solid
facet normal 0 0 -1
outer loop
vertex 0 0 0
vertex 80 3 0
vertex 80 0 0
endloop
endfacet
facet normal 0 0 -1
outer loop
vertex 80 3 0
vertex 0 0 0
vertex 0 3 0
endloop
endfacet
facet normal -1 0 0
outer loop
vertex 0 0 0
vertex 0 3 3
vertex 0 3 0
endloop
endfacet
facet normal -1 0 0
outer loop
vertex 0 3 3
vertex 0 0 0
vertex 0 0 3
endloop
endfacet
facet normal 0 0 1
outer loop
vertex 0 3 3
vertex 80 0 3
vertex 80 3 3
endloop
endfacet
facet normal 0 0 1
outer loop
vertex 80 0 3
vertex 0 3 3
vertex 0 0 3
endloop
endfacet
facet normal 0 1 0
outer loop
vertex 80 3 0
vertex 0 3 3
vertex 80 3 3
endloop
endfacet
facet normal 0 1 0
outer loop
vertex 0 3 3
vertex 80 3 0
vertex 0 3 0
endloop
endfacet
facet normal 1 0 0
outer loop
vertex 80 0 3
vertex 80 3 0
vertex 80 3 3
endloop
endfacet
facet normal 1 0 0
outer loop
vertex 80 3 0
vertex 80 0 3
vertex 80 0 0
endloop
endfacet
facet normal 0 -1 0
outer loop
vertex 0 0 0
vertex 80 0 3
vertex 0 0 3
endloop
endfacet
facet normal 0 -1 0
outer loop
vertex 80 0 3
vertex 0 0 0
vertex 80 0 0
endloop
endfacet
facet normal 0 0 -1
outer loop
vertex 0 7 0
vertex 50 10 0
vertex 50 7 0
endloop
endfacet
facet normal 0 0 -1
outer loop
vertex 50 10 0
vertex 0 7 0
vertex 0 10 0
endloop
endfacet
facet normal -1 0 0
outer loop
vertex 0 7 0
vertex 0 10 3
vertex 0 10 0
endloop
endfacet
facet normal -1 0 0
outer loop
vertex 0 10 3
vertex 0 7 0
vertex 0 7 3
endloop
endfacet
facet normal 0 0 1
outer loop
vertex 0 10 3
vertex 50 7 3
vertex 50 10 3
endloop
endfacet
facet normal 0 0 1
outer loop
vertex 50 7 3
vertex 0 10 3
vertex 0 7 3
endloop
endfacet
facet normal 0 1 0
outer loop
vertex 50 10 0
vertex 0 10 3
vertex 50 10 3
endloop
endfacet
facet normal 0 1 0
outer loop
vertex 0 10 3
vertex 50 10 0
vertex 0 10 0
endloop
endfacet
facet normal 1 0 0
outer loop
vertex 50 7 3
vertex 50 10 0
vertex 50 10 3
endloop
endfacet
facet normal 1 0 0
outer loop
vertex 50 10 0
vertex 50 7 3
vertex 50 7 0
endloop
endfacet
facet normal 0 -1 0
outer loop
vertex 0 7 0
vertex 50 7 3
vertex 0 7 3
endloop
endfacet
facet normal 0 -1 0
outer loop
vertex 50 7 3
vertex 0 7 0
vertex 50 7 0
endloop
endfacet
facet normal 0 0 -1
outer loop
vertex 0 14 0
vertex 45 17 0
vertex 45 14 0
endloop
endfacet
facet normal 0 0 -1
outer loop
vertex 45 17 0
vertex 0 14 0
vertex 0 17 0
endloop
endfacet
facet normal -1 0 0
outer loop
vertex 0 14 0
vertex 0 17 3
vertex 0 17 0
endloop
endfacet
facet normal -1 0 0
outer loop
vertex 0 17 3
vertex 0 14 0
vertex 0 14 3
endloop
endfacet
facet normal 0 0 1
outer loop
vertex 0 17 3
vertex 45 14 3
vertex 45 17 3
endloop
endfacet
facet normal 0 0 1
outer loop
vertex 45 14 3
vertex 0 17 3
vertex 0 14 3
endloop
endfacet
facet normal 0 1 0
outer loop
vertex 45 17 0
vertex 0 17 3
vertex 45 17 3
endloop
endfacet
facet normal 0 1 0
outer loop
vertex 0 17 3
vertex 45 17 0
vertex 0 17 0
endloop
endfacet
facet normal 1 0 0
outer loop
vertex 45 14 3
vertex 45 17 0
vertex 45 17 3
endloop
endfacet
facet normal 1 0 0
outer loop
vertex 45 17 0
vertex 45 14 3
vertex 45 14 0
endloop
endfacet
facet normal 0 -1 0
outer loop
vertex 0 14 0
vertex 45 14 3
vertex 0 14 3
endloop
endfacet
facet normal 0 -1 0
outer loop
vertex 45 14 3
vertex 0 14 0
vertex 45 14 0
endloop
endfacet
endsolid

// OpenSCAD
/* [Output] */
make_3d = true; // [false:true]

/* [Dimensions] */
example_width = 80;             // [40:5:160]
example_depth = 50;             // [30:5:120]
example_height = 45;            // [20:5:100]
example_material_thickness = 3; // [1:0.5:8]

/* [Example] */
show_dimension_blocks = true;

/* [Hidden] */

if (show_dimension_blocks)
    tpl_config_example(
        width=example_width,
        depth=example_depth,
        height=example_height,
        thickness=example_material_thickness,
        make_3d=make_3d);

function tpl_default_size() = [80, 50, 45];
function tpl_default_thickness() = 3;
function tpl_default_sheet_size() = [300, 200];

// A configuration file still supplies a useful standalone scale example.
module tpl_config_example(width=80, depth=50, height=45, thickness=3,
                          make_3d=false)
{
    sizes = [[width, thickness], [depth, thickness], [height, thickness]];
    for (i = [0:2])
        translate([0, i*(thickness+4)])
            if (make_3d)
                linear_extrude(height=thickness)
                    square(sizes[i]);
            else
                square(sizes[i]);
}
